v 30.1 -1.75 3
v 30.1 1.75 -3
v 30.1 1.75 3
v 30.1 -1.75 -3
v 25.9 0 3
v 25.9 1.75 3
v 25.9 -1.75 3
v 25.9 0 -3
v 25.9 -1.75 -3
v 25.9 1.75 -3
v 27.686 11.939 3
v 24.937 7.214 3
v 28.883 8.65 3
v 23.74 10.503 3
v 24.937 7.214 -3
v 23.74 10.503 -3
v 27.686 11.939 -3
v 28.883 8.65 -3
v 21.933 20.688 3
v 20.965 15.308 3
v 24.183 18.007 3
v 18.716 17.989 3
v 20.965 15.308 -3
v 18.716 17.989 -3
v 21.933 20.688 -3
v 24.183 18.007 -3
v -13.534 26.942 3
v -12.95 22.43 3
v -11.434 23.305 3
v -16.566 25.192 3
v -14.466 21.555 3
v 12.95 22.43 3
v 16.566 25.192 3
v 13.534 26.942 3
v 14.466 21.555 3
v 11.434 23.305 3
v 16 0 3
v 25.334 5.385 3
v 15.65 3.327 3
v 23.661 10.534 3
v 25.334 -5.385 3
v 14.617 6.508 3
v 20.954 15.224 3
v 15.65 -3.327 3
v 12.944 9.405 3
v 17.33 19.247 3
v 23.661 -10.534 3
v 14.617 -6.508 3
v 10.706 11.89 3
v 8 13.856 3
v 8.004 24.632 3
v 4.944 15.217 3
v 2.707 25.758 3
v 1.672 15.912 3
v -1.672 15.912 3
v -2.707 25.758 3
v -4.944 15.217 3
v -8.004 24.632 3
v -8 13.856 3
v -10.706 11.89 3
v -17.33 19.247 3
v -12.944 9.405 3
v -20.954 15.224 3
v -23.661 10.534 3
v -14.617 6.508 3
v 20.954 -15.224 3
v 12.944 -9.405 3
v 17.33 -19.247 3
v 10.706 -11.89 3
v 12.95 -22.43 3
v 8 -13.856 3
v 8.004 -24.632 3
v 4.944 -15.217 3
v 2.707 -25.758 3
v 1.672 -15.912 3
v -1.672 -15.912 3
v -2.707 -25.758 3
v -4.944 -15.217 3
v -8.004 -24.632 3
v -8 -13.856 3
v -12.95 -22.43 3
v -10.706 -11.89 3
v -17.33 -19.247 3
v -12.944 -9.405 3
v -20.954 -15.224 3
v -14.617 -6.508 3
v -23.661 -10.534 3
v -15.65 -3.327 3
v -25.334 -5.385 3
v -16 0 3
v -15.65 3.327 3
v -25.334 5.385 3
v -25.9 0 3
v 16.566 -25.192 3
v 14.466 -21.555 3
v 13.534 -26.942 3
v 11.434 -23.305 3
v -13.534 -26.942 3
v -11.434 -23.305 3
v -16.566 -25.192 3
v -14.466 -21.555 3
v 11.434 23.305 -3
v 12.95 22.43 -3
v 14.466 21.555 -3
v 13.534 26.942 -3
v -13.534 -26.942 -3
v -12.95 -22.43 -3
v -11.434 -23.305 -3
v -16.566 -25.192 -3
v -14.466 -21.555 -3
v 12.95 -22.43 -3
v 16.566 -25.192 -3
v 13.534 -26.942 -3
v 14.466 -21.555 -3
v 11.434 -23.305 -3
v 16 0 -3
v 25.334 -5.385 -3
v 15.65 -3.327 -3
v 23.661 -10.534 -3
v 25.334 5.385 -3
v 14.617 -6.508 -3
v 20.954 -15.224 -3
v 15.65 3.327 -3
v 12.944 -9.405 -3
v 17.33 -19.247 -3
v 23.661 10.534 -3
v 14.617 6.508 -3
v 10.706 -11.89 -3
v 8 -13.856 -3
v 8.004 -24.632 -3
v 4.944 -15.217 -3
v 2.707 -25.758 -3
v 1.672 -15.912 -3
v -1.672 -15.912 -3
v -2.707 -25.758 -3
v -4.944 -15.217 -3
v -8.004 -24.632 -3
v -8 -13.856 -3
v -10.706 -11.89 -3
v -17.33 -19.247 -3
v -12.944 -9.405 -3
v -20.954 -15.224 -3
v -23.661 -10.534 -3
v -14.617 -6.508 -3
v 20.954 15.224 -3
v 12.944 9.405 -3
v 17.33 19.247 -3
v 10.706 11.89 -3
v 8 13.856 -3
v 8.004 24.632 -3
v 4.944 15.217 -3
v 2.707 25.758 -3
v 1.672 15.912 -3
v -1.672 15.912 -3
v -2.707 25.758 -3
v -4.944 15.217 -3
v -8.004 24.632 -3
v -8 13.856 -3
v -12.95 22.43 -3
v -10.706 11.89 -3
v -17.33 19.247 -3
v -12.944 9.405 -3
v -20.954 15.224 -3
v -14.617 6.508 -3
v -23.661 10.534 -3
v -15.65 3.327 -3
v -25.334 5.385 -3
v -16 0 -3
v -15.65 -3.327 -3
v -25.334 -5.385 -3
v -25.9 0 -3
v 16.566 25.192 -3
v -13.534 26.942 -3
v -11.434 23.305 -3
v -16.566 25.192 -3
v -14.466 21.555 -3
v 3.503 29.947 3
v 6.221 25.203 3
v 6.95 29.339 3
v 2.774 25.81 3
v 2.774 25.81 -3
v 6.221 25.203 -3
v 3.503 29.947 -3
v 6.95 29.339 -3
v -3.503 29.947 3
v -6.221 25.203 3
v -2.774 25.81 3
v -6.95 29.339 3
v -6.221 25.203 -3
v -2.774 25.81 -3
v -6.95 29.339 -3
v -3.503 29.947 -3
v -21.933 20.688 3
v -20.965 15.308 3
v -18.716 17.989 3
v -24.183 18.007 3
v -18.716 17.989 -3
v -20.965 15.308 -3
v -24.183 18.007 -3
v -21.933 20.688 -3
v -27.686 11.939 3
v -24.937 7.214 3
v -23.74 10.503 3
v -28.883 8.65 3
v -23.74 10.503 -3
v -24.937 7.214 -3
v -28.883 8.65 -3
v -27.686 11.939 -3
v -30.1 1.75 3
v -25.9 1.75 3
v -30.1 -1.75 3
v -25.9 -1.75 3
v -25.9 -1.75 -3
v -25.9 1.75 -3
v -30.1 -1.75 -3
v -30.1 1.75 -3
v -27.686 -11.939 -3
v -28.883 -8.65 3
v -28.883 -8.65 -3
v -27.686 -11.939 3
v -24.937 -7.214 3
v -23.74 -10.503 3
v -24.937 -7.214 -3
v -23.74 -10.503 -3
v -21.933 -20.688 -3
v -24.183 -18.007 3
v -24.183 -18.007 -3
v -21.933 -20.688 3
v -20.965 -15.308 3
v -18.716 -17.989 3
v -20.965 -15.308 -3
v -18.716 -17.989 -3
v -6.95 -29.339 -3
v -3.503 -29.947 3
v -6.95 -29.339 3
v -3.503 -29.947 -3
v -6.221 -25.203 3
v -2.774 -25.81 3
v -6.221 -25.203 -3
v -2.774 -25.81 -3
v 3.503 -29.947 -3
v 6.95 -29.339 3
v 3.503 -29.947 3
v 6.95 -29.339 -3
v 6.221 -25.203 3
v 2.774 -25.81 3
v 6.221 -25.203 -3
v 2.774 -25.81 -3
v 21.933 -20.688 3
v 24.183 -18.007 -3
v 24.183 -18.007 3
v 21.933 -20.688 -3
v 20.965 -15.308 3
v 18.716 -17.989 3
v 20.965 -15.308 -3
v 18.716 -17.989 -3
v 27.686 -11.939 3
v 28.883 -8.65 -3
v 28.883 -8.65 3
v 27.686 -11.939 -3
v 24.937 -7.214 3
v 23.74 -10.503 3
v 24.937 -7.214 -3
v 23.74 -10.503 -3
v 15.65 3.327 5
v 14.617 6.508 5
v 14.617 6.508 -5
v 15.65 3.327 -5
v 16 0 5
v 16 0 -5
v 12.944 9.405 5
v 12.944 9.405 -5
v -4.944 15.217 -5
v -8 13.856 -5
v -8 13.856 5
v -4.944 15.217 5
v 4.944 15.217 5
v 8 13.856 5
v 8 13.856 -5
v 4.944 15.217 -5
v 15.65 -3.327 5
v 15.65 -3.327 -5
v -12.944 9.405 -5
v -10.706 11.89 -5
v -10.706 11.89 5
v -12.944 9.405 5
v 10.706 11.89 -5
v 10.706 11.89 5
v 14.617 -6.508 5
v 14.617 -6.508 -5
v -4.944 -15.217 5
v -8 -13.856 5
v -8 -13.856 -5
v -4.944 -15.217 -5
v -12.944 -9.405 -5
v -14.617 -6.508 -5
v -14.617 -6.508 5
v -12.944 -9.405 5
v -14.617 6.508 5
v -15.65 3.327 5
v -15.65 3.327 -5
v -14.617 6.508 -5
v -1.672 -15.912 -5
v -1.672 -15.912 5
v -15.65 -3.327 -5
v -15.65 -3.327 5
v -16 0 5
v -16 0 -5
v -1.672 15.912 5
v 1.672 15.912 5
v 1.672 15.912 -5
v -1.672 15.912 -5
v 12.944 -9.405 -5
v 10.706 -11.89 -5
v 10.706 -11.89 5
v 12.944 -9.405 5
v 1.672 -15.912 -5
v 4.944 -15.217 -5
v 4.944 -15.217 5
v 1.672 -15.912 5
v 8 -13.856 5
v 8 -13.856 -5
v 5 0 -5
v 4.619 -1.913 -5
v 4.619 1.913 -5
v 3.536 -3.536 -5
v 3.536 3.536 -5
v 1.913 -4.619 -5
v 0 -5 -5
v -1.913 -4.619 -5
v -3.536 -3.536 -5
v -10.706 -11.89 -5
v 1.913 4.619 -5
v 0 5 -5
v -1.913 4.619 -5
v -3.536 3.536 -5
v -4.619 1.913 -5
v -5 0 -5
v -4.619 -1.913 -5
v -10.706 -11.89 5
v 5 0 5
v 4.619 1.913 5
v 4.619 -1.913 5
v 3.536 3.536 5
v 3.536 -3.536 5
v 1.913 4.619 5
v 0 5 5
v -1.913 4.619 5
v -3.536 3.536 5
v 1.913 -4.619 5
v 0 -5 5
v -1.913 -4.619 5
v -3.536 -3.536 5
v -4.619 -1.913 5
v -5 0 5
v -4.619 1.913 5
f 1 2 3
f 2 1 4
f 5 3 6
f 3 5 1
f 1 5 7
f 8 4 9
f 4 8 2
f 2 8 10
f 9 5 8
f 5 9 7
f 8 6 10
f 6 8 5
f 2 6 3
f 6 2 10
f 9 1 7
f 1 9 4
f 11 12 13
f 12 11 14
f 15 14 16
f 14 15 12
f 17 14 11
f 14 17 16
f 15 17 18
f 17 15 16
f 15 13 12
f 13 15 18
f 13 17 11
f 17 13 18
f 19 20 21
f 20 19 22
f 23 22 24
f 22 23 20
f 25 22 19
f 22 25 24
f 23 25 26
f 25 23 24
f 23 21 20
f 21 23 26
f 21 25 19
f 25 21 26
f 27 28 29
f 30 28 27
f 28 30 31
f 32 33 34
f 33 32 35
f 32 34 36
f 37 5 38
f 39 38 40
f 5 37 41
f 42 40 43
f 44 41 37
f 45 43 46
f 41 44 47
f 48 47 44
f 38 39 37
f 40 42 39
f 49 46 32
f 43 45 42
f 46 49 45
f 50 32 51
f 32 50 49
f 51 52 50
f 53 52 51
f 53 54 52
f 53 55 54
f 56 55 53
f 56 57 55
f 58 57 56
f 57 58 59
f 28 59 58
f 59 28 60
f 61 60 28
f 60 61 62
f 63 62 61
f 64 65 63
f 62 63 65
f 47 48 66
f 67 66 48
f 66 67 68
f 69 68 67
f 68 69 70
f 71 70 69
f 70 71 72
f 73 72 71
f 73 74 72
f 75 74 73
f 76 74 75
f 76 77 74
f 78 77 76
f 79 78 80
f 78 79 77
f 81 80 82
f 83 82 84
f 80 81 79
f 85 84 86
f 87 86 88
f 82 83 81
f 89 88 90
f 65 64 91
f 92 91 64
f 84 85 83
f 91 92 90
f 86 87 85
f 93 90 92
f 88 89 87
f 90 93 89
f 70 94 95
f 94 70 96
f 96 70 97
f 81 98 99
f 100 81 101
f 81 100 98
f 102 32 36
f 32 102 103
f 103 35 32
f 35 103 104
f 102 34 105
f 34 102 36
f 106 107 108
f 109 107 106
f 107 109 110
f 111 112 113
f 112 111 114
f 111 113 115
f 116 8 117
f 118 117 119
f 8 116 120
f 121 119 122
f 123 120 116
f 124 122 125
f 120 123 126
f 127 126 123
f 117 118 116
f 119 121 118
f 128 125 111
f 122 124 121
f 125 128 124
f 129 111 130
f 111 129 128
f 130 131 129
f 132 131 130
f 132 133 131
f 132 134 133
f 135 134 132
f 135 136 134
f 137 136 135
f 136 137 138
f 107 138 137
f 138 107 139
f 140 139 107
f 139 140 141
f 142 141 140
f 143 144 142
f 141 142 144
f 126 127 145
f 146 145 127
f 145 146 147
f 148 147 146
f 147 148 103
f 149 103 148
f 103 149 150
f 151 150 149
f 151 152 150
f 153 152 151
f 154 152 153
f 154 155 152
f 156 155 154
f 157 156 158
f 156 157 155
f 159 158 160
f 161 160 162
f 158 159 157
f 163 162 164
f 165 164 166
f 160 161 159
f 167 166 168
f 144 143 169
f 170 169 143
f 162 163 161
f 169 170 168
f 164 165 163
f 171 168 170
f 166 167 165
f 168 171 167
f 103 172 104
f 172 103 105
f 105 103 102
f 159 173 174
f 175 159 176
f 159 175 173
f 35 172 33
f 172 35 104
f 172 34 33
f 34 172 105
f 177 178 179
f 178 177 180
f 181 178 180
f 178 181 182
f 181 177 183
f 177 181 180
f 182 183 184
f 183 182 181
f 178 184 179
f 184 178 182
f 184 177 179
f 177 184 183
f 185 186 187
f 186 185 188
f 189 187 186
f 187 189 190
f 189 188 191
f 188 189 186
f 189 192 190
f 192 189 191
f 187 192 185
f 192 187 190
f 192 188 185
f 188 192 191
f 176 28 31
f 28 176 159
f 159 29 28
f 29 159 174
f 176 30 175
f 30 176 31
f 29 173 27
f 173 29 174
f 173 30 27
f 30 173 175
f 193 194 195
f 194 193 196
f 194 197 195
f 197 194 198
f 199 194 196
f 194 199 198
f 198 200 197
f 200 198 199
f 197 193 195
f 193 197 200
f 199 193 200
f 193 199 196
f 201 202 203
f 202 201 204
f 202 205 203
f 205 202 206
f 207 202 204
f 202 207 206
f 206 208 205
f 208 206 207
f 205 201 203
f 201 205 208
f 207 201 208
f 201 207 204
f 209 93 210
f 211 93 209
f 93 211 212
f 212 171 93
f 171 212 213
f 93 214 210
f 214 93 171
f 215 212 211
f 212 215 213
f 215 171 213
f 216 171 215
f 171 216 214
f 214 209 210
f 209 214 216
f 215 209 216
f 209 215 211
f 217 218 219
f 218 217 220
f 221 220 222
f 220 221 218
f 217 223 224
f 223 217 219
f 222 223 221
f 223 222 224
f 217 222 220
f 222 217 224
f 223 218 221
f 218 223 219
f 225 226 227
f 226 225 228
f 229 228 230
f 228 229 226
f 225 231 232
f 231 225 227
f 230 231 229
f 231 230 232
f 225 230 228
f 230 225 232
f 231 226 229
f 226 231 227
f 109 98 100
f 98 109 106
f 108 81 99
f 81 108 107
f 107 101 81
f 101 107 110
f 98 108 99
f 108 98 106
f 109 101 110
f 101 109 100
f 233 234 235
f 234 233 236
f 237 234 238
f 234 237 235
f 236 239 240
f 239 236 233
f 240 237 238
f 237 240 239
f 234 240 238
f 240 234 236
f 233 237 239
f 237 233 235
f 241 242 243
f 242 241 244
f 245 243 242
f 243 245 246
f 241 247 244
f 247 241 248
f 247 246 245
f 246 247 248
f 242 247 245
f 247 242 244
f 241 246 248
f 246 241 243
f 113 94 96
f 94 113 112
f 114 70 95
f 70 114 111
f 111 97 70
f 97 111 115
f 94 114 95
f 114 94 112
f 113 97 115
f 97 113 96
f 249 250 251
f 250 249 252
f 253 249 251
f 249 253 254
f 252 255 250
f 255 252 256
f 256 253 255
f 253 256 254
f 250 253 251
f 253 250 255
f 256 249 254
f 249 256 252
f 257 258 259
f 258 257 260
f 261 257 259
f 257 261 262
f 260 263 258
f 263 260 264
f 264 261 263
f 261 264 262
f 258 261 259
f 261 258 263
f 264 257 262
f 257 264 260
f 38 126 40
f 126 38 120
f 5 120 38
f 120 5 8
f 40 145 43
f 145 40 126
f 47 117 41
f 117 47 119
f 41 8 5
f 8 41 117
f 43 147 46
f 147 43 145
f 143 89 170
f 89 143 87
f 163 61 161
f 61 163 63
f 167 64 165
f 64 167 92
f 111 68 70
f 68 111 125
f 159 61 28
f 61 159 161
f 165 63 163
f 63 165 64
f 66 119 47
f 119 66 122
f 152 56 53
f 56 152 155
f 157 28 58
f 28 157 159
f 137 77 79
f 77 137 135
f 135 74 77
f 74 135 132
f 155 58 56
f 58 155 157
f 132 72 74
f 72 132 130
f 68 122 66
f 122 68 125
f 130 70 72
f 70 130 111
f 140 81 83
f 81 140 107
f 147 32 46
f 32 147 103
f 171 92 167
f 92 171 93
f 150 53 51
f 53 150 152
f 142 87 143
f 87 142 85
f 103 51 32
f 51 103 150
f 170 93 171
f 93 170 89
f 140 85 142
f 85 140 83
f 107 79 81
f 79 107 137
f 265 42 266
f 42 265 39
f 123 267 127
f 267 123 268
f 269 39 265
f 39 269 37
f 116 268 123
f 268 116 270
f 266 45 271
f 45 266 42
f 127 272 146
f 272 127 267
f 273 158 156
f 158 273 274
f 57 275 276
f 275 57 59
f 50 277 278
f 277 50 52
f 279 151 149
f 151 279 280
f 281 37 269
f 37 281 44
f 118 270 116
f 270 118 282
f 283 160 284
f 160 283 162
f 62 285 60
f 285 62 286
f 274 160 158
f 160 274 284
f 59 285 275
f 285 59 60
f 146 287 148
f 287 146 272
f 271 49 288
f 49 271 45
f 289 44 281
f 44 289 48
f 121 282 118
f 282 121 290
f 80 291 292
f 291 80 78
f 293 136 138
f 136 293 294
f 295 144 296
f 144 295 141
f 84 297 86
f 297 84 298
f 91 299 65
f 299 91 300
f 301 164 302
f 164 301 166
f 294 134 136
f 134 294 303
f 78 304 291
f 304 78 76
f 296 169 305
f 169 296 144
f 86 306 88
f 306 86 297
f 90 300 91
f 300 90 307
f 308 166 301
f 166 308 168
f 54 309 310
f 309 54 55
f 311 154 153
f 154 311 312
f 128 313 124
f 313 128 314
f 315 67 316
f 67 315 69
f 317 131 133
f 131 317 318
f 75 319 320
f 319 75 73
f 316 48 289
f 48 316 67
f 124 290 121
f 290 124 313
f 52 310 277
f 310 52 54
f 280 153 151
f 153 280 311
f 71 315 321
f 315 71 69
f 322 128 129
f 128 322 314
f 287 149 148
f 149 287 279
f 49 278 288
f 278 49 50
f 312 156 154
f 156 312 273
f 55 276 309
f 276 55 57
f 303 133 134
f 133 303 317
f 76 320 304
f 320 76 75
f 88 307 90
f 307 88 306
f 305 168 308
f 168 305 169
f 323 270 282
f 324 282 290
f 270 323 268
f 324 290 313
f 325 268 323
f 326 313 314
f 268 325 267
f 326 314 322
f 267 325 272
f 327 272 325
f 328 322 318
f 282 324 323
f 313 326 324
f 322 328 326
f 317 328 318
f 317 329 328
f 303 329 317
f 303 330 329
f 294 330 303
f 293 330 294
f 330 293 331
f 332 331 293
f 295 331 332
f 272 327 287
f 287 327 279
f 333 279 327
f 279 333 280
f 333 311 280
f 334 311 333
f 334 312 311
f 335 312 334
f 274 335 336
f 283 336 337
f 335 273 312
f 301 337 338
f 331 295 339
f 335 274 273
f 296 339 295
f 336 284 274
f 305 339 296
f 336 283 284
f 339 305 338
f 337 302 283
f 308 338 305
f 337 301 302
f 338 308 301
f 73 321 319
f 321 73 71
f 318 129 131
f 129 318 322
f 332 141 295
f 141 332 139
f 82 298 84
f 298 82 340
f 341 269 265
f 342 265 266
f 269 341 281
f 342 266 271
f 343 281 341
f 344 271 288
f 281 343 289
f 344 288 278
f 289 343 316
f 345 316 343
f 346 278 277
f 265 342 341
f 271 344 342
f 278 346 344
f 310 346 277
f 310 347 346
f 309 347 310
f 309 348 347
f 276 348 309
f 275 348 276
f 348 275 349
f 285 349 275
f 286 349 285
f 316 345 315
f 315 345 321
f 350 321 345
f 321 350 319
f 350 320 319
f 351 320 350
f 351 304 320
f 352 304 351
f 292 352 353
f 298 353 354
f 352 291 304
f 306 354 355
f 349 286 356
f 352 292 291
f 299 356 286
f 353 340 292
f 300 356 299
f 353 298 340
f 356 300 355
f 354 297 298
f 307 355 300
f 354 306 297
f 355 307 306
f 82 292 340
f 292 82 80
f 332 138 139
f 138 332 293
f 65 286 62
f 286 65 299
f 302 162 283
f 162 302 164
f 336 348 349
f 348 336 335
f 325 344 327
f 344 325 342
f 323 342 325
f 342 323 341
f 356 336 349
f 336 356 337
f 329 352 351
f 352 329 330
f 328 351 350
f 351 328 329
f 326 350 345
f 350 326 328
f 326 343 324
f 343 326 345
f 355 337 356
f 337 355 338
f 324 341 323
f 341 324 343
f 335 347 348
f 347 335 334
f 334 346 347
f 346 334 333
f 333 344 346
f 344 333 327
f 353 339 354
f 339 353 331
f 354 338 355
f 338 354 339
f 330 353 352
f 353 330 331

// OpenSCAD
// ========================================================
// Parametric 3D Spur Gear (Sharp Teeth)
// ========================================================

// Main Parameters
num_teeth = 18;
pitch_radius = 28;
thickness = 6;
shaft_radius = 5;

// Structural details
tooth_width = 3.5;
tooth_depth = 4.2;
hub_radius = 16;
hub_thickness = 10;

// Radial teeth array
module gear_teeth() {
    for (angle = [0:20:340]) {
        rotate([0, 0, angle]) {
            // Position teeth precisely at pitch radius boundary
            translate([pitch_radius, 0, 0]) {
                cube([tooth_depth, tooth_width, thickness], center=true);
            }
        }
    }
}

// Gear Assembly
difference() {
    union() {
        // Base disk using dedendum/minor radius
        cylinder(h=thickness, r=pitch_radius - tooth_depth * 0.5, center=true);
        
        // Solid center hub
        cylinder(h=hub_thickness, r=hub_radius, center=true);
        
        // Outer teeth profile
        gear_teeth();
    }
    
    // Axle bore
    cylinder(h=hub_thickness + 2, r=shaft_radius, center=true);
}
